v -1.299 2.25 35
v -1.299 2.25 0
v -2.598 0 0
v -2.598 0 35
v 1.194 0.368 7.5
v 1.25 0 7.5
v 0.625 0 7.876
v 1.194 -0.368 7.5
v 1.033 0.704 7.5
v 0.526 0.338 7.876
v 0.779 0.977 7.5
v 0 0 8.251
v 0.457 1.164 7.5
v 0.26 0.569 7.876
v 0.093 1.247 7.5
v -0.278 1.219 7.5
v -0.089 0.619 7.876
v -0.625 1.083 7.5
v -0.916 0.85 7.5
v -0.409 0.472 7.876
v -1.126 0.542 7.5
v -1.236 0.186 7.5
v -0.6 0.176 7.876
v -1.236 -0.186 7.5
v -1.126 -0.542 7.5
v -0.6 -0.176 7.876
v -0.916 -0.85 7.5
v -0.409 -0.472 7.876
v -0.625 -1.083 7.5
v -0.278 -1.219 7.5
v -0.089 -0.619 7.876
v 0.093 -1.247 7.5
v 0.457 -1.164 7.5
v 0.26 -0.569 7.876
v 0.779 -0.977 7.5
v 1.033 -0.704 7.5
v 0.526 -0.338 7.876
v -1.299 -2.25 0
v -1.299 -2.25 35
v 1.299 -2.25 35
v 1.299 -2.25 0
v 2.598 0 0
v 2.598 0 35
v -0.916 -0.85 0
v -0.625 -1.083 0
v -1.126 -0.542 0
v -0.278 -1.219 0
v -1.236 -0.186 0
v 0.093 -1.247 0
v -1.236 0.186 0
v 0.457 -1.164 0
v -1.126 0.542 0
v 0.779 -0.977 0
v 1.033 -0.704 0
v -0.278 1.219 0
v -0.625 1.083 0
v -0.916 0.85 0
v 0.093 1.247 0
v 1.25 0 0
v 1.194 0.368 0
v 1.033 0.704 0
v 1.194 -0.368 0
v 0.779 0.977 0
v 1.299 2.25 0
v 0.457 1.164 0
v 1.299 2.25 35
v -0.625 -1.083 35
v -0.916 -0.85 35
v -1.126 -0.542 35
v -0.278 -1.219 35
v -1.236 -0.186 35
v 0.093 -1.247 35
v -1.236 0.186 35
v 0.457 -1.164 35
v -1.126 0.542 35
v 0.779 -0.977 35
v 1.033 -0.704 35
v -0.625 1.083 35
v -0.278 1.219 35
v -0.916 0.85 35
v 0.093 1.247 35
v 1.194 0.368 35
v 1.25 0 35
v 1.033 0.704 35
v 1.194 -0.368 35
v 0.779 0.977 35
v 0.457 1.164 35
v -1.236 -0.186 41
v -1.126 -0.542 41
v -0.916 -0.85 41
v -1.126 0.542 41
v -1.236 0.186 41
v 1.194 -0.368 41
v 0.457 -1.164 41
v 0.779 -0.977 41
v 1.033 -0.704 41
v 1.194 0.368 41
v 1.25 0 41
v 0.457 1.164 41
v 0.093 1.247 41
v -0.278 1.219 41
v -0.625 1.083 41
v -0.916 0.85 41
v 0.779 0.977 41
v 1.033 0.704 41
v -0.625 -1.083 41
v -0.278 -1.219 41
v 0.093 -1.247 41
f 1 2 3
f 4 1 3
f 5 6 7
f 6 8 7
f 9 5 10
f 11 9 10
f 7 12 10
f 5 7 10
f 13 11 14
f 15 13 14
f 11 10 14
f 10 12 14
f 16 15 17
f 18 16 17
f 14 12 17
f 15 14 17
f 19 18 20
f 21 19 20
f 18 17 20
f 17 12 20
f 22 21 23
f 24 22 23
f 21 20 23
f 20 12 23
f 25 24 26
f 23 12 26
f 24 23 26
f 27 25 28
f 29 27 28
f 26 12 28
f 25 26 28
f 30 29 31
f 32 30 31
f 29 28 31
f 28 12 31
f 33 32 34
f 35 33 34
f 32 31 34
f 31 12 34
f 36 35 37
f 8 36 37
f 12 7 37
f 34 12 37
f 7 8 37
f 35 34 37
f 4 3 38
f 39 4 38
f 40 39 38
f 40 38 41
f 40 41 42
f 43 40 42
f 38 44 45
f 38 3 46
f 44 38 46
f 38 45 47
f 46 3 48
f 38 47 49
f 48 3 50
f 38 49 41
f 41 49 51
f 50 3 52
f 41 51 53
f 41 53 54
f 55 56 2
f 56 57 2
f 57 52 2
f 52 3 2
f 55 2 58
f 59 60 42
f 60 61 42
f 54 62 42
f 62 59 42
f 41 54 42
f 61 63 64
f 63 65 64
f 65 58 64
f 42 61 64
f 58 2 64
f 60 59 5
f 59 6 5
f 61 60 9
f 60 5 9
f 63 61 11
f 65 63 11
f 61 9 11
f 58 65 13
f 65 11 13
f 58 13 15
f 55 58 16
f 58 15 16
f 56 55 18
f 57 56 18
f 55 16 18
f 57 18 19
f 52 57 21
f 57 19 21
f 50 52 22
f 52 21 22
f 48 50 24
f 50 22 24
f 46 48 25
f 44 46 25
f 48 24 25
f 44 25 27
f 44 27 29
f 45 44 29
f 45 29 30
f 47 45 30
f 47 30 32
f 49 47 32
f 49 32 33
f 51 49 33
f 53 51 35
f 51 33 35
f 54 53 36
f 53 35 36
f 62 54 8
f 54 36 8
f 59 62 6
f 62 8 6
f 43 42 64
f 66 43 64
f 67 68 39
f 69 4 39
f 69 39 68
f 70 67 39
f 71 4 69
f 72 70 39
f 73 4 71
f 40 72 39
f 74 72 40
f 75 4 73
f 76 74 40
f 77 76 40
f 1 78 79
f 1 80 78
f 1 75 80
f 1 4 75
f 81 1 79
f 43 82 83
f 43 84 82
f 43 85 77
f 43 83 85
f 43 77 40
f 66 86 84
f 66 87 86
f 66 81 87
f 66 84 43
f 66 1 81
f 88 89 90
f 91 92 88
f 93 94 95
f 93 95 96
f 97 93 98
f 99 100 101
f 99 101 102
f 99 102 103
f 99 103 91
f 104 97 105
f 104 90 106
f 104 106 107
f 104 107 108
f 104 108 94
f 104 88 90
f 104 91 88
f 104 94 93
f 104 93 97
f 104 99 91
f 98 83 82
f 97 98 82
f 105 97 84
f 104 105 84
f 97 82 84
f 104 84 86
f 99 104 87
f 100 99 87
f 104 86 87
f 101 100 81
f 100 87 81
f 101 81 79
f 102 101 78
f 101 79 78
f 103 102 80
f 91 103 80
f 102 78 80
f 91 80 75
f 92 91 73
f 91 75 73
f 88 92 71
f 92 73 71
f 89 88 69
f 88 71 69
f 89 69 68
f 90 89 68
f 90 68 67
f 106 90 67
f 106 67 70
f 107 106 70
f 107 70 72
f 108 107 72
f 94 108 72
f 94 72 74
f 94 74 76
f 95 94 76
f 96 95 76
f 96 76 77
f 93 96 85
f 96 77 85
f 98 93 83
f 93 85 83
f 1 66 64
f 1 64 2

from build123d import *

# Parameters (mm, degrees)
EXTRUDE_1_DEPTH = 35
SKETCH_2_R      = 1.25
EXTRUDE_2_DEPTH = 6


# Read off the part's stored shape, not the designer's step: M3 螺纹孔1
with BuildPart() as part:
    # 草图1 → 凸台-拉伸1 (new body)
    with BuildSketch(Plane.XY):
        Polygon((2.598076211, 0), (1.299038106, 2.25), (-1.299038106, 2.25), (-2.598076211, 0), (-1.299038106, -2.25), (1.299038106, -2.25), align=None)
    extrude(amount=EXTRUDE_1_DEPTH)

    # 草图2 → 凸台-拉伸2 (add)
    with BuildSketch(Plane.XY.offset(35)):
        Circle(SKETCH_2_R)
    extrude(amount=EXTRUDE_2_DEPTH)

    # M3 螺纹孔1 outline → M3 螺纹孔1 (revolve, cut)
    with BuildSketch(Plane.XZ):
        Polygon((1.25, 7.5), (0, 8.251075774), (0, 0), (1.25, 0), align=None)
    revolve(axis=Axis((0, 0, 0), (0, 0, 1)), mode=Mode.SUBTRACT)


solid = part.part
